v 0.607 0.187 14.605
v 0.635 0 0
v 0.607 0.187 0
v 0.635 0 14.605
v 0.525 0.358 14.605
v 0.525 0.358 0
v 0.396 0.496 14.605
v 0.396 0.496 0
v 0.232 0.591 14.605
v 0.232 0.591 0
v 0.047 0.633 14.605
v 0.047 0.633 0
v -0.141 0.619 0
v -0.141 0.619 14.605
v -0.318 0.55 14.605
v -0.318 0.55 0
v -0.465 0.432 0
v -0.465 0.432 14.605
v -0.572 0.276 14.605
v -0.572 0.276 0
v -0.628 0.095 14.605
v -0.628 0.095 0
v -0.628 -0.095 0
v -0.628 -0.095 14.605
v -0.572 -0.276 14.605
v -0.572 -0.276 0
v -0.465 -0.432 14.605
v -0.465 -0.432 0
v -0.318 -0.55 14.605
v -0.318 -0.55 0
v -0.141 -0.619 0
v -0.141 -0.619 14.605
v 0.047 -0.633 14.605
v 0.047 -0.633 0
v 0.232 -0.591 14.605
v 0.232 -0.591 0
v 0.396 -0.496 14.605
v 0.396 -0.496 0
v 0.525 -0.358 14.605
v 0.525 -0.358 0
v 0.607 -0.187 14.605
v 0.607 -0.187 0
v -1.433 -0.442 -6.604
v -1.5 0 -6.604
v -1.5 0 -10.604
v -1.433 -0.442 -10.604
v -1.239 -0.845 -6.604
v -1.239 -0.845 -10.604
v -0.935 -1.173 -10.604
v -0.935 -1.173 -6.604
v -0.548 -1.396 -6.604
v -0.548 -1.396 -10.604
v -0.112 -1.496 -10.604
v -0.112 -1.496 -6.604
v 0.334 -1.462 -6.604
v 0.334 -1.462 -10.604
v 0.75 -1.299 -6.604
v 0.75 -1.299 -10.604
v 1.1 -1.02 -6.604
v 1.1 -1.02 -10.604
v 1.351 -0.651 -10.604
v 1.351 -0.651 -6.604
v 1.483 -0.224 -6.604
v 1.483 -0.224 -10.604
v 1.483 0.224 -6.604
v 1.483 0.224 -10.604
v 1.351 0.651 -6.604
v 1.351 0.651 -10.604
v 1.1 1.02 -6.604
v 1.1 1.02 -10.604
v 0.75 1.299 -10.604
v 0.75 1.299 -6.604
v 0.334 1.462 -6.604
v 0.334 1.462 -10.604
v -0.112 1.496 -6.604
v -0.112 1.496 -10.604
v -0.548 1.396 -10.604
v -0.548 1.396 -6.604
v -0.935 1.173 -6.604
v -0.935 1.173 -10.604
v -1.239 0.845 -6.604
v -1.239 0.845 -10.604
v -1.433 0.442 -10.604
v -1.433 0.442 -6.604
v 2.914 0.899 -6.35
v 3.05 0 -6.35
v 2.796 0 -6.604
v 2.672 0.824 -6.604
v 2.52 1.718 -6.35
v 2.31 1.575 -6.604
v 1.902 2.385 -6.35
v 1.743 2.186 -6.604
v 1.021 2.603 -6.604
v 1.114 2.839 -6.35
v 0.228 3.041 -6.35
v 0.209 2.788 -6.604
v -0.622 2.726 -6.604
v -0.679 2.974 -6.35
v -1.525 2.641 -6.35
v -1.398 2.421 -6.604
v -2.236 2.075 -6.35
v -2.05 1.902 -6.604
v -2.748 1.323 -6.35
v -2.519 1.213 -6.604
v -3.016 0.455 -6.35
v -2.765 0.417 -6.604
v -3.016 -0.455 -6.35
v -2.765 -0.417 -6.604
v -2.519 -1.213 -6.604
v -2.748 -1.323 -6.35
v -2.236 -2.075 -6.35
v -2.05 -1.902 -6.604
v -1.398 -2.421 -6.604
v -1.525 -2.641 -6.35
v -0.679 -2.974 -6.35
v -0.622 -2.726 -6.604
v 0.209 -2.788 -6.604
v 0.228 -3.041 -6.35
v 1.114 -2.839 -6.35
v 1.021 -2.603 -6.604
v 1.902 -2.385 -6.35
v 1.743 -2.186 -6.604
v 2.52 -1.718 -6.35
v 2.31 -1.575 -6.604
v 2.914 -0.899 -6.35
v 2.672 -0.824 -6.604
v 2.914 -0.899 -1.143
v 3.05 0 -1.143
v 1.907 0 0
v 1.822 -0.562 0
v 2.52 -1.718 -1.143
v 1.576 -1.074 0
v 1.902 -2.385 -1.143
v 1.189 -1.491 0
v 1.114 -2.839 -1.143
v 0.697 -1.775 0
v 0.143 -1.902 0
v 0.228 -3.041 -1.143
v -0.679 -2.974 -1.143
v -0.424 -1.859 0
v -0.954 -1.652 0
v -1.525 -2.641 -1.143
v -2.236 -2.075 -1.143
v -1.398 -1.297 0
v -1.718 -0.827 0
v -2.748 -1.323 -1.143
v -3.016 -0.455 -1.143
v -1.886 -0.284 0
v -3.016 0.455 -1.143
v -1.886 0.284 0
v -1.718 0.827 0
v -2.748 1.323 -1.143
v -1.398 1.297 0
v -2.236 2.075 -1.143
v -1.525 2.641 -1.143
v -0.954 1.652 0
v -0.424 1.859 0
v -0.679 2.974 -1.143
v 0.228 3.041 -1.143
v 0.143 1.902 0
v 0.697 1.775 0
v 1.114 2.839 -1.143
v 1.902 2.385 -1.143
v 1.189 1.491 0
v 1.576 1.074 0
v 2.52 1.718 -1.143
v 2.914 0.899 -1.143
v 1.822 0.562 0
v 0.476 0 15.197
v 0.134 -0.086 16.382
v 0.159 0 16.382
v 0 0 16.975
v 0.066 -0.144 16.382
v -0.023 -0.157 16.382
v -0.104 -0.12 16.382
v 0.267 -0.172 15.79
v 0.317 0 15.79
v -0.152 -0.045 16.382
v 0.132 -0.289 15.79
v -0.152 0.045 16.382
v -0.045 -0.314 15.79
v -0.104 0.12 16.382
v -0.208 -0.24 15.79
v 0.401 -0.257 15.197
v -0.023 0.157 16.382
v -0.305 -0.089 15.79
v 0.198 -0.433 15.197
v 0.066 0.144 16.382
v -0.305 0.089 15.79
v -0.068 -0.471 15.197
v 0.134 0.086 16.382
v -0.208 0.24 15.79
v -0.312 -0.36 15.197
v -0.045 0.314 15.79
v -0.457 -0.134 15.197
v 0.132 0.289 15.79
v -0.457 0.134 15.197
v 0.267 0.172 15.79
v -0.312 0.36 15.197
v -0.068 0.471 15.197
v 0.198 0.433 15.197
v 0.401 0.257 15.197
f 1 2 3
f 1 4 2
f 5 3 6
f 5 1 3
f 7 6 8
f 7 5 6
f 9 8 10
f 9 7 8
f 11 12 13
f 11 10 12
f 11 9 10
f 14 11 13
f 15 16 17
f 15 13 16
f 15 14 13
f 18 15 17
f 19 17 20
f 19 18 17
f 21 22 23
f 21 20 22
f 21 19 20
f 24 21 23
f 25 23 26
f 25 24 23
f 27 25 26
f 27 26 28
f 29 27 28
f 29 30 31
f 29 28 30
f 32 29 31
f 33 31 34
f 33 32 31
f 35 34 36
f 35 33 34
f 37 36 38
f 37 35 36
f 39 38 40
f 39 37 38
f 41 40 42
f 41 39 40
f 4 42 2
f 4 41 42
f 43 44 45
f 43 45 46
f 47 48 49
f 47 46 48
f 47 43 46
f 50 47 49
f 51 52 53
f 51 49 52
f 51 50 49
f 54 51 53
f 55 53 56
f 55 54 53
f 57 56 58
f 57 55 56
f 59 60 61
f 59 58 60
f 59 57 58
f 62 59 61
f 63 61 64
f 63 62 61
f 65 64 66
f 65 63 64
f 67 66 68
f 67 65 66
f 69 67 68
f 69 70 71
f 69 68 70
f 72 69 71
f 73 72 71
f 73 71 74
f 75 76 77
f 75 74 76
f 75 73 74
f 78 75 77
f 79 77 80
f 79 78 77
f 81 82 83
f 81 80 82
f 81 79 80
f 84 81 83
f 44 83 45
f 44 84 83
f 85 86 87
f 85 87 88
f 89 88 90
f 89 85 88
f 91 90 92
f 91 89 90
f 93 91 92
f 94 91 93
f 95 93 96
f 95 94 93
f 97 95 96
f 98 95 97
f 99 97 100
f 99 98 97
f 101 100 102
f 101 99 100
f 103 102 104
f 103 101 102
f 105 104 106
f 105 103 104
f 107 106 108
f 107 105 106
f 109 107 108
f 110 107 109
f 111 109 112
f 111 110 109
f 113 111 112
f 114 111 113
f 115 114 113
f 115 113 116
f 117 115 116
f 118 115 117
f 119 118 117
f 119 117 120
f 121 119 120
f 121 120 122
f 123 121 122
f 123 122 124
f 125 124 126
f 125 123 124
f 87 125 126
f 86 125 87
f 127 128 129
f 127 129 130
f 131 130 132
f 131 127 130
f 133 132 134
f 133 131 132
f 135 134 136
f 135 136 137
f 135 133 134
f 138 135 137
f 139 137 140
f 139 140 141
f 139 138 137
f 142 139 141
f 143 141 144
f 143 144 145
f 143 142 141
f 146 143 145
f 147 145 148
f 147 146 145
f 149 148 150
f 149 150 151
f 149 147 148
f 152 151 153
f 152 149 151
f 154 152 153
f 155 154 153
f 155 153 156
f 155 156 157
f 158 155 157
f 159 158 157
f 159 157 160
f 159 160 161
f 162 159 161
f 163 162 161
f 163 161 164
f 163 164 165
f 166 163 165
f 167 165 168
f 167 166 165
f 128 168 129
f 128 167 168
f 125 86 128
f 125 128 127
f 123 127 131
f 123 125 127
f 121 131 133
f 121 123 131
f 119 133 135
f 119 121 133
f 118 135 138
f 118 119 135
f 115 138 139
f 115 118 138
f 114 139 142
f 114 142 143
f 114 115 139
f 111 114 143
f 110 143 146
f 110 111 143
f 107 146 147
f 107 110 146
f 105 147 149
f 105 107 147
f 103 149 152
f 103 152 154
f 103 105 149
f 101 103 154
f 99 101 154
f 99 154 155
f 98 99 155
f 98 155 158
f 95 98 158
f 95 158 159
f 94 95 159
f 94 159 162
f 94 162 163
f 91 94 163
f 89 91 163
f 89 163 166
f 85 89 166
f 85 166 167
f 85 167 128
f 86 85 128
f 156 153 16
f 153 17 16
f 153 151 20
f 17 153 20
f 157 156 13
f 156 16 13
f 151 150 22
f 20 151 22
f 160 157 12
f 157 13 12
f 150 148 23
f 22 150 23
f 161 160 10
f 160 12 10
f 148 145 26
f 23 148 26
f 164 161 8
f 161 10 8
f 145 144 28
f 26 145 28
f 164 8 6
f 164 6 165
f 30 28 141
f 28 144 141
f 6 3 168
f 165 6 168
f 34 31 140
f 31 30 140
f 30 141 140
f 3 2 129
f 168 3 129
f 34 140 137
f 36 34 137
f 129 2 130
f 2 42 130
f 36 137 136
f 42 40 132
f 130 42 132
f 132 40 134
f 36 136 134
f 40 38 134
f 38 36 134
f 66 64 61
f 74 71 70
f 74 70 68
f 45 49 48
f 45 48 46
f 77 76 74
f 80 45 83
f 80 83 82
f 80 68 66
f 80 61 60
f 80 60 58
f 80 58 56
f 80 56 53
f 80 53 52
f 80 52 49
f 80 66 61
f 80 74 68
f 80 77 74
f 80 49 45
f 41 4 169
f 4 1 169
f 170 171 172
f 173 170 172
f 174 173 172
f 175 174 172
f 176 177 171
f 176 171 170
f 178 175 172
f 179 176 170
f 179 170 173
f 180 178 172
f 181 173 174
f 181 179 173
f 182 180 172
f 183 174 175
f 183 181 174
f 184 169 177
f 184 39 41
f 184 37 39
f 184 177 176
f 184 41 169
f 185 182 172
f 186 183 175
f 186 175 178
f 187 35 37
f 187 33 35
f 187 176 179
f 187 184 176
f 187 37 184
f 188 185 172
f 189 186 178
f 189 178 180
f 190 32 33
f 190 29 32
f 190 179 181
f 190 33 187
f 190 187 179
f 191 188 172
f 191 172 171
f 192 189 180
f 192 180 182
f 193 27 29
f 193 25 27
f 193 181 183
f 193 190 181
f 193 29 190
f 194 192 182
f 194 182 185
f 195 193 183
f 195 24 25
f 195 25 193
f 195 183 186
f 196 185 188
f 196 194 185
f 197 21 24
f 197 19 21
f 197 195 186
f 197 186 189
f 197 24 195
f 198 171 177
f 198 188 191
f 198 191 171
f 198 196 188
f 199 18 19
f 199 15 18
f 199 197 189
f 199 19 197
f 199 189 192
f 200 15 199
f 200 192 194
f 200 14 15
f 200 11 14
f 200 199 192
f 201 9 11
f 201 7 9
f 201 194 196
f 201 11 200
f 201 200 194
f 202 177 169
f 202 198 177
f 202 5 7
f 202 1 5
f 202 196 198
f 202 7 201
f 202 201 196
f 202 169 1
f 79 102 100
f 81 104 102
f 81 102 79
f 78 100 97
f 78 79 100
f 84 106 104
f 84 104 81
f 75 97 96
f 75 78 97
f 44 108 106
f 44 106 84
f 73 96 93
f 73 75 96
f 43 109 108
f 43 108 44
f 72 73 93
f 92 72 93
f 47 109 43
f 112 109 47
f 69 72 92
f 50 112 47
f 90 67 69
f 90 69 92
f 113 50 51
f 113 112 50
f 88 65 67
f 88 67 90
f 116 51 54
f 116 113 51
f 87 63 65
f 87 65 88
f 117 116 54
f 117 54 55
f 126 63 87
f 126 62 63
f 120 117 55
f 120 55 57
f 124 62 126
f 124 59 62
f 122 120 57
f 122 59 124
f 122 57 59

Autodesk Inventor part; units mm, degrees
ref_plane "YZ Plane" through (0, 0, 0) normal (1, 0, 0) x (0, 1, 0)
ref_plane "XZ Plane" through (0, 0, 0) normal (0, 1, 0) x (-1, 0, 0)
ref_plane "XY Plane" through (0, 0, 0) normal (0, 0, 1) x (1, 0, 0)
sketch "Sketch1" plane through (0, 0, 0) normal (0, 1, 0) x (-1, 0, 0)
  line L0 (0, 0) -> (-3.05, 0)
  line L1 (-3.05, 0) -> (-3.05, -6.604)
  line L2 (-3.05, -6.604) -> (0, -6.604)
  line L3 (0, -6.604) -> (0, 0)
  line L4 (0, 0) -> (-0.635, 0)
  line L5 (-0.635, 0) -> (-0.635, 14.605)
  line L6 (-0.635, 14.605) -> (0, 14.605)
  line L7 (0, 14.605) -> (0, 0)
  line L8 (-0.635, 14.605) -> (0, 16.9749)
  line L9 (-0.635, 14.605) -> (1.8185, 14.605) construction
  line L10 (0, 16.9749) -> (0, 14.605)
  dimension "d0" = 3.05
  dimension "d1" = 6.604
  dimension "d2" = 0.635
  dimension "d3" = 14.605
  dimension "d13" = 75
  dimension "d14" = 15
  dimension "d15" = 16.9748
  dimension "d16" = 23.5788
revolve "Revolution1" add sketch "Sketch1" angle 360 about axis through (0, 0, 14.605) along (0, 0, -1)
sketch "Sketch2" plane through (0, 0, -6.604) normal (0, 0, -1) x (-1, 0, 0)
  circle A0 centre (0, 0) radius 3.05 projected
  circle A1 centre (0, 0) radius 1.5
  dimension "d5" = 3
extrude "Extrusion1" add sketch "Sketch2" along normal blind 4 contours A1
chamfer "Chamfer1" distance 1.143 angle 45 1 edges at (-3.05, 0, 0)
chamfer "Chamfer2" distance 0.254 angle 45 1 edges at (-3.05, 0, -6.604)
thread "Thread1" size "M3x0.5" class "6g" standard "ANSI Metric M Profile" full length
properties part number "carbide_probe_30deg_tip_r02" material "Steel, High Strength, Low Alloy"
